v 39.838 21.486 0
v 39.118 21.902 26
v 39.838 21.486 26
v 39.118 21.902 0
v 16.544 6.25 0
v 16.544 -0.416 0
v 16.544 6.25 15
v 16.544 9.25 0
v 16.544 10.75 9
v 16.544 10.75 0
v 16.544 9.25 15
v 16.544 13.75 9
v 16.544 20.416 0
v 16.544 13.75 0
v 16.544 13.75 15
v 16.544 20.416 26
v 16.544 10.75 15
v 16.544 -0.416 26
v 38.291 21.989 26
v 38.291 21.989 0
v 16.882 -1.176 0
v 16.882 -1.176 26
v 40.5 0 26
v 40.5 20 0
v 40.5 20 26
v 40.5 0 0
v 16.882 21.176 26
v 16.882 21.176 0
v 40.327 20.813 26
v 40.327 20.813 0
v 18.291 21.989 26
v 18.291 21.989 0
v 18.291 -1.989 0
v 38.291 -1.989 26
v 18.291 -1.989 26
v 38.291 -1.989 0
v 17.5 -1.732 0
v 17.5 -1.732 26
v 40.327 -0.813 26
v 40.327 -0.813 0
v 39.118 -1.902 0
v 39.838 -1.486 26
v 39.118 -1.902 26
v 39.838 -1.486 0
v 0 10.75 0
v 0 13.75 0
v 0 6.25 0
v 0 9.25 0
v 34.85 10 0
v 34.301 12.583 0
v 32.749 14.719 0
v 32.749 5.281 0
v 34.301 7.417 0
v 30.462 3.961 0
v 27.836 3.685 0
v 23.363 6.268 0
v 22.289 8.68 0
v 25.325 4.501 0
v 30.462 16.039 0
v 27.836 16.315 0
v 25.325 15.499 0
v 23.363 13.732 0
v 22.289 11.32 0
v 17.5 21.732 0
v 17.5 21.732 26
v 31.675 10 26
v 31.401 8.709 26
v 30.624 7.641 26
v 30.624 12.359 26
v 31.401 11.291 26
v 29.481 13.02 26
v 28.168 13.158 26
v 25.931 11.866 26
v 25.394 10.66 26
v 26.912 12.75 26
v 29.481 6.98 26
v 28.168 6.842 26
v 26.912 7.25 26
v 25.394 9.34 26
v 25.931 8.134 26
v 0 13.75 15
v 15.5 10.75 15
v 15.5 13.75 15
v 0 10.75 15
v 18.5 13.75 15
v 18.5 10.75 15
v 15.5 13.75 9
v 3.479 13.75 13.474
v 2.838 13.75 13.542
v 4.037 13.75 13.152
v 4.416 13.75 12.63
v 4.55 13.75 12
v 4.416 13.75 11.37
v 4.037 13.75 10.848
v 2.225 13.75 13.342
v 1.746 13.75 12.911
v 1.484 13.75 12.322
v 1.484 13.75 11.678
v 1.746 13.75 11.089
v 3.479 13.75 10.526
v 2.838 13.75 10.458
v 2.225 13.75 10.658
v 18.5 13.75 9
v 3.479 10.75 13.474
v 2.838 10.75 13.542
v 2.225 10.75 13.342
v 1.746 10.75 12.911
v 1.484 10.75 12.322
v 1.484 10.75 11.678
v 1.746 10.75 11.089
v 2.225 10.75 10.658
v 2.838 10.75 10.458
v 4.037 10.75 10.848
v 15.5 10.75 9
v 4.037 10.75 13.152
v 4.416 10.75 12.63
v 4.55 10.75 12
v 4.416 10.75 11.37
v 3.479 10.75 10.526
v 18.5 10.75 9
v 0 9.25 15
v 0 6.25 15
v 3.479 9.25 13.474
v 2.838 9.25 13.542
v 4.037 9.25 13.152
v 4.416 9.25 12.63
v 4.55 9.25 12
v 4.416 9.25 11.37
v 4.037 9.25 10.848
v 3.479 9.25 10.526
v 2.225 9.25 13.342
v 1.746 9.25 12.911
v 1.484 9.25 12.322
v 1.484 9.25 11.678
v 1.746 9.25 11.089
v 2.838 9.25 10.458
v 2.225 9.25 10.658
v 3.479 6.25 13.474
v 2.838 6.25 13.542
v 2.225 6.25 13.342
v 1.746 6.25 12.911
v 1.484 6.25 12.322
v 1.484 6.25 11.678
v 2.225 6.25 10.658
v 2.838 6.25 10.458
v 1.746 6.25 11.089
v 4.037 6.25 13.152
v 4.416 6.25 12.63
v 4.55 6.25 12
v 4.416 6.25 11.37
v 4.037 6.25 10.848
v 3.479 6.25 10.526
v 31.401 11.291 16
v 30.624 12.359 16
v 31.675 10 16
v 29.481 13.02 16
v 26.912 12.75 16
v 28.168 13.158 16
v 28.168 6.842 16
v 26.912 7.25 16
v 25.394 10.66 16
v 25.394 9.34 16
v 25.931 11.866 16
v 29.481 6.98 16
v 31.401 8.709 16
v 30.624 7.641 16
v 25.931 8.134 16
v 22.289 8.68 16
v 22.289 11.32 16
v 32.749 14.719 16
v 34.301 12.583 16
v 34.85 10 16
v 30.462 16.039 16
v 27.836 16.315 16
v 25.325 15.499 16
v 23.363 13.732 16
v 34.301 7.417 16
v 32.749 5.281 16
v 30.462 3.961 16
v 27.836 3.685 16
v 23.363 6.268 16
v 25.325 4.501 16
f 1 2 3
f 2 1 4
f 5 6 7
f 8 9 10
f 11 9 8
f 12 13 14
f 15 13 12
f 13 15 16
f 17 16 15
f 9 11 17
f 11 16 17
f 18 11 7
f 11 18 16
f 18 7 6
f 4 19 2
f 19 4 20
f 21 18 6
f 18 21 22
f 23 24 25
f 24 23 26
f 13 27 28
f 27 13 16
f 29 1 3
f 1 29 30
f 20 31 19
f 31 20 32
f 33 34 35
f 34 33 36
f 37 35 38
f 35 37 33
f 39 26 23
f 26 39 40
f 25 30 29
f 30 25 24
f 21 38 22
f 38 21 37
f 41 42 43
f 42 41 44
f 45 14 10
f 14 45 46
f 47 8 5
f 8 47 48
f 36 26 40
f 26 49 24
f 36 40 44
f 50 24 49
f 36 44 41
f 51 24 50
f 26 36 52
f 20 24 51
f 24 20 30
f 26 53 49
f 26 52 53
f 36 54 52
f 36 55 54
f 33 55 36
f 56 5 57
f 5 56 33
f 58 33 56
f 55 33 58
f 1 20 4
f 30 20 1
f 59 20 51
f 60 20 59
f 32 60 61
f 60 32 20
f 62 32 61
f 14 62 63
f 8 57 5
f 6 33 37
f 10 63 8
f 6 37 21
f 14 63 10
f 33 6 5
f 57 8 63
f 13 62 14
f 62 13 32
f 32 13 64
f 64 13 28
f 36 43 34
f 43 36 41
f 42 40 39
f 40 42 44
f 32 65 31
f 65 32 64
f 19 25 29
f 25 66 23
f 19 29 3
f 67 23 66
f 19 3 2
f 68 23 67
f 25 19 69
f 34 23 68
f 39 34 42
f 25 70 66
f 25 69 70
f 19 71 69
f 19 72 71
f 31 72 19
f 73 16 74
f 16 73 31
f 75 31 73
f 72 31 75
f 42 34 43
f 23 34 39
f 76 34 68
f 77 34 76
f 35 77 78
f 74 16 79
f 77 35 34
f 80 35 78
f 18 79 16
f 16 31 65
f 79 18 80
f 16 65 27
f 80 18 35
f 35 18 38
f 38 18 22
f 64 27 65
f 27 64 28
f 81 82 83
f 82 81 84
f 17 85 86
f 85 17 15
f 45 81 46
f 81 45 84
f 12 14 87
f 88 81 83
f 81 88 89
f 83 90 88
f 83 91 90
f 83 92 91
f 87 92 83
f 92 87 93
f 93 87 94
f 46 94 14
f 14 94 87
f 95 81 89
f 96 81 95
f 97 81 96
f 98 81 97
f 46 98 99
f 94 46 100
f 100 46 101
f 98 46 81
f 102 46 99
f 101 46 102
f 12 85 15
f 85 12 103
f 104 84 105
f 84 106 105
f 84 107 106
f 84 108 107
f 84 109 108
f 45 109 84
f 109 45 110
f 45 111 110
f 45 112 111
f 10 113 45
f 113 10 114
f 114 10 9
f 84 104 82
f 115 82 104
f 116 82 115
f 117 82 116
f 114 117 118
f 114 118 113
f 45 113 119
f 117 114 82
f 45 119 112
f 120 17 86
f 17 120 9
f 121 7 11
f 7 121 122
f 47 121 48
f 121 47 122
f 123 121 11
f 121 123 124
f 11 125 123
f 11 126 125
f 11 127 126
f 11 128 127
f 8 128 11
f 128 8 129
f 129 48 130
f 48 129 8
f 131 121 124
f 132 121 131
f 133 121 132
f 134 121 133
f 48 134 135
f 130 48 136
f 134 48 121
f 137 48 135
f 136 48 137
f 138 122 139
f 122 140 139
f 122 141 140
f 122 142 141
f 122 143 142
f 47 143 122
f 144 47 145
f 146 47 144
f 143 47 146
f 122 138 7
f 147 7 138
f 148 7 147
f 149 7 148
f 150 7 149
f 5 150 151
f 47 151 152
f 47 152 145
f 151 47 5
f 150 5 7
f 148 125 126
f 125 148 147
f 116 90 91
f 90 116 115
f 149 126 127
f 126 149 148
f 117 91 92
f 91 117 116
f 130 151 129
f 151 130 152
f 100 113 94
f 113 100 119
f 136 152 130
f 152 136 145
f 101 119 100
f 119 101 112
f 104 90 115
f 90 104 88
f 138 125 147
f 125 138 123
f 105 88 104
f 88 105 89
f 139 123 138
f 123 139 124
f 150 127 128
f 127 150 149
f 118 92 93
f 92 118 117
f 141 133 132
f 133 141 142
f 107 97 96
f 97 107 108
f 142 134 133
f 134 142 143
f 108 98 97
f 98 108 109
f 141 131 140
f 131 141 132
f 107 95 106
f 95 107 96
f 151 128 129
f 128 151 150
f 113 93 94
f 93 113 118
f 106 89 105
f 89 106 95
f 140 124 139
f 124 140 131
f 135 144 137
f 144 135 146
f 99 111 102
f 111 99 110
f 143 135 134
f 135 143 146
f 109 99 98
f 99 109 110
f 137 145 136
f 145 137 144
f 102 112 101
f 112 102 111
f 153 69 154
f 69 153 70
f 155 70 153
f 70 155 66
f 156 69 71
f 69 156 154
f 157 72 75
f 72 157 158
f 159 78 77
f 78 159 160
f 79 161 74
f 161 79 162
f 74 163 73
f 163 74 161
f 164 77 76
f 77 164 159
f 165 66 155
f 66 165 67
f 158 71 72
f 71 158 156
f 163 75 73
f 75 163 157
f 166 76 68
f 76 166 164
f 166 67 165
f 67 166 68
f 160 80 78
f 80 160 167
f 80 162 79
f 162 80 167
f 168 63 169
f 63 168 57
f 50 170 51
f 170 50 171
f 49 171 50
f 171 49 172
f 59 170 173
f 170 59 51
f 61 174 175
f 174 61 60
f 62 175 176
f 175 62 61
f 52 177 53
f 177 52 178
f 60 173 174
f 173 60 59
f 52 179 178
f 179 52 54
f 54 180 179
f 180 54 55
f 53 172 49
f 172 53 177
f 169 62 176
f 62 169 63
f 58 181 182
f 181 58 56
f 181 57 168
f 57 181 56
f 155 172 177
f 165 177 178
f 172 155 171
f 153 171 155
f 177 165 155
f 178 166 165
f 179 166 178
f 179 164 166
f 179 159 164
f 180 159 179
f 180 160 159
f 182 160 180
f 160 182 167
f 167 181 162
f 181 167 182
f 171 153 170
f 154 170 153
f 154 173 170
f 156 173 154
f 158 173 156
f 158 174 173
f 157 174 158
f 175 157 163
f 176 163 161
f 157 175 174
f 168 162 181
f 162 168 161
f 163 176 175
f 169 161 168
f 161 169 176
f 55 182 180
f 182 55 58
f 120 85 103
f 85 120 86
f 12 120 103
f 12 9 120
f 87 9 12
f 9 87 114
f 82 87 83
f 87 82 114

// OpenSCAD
module body() {

    // block
    translate([18.5,0,0]) {
        $fn=15;
        minkowski() {
            cube([20,20,25]);
            cylinder(r=2,h=1);
        }
    }
    // back arm
    translate([0,10.75,0]) {
        cube([18.5,3,15]);
    }
    // front arm
    translate([0,6.25,0]) {
    cube([18.5,3,15]);
    }
}

module holes() {
    // 3mm mounting screw
    translate([3,16,12]) {
        rotate([90,0,0]) {
            cylinder(12,1.55,1.55);
        }
    }
    // 1/4" cam mount
    translate([28.5,10,-1]) {
        rotate([0,0,0]) {
            cylinder(30,.25*25.4/2,.25*25.4/2);
        }
    }
    // cutout
    translate([28.5,10,-1]) {
        rotate([0,0,0]) {
            cylinder(17,.5*25.4/2,.5*25.4/2);
        }
    }
}

module notch() {
    // platform notch
    translate([15.5,10.75,9]) {
        cube([3, 3, 6]);
    }
}

module main() {
    difference() {
        body();
        notch();
        holes();
    }
}

main();

//difference() {
//    cube([nxx*(bxx+wall)+wall,nyy*(byy+wall)+wall,bzz+wall]);
//    holes();
//}

$fn=15;
//minkowski() {
//      difference() {
//          cube([nxx*(bxx+wall)+wall,nyy*(byy+wall)+wall,bzz+wall]);
//          holes();
//      }
//      sphere(r=wall);
//}
